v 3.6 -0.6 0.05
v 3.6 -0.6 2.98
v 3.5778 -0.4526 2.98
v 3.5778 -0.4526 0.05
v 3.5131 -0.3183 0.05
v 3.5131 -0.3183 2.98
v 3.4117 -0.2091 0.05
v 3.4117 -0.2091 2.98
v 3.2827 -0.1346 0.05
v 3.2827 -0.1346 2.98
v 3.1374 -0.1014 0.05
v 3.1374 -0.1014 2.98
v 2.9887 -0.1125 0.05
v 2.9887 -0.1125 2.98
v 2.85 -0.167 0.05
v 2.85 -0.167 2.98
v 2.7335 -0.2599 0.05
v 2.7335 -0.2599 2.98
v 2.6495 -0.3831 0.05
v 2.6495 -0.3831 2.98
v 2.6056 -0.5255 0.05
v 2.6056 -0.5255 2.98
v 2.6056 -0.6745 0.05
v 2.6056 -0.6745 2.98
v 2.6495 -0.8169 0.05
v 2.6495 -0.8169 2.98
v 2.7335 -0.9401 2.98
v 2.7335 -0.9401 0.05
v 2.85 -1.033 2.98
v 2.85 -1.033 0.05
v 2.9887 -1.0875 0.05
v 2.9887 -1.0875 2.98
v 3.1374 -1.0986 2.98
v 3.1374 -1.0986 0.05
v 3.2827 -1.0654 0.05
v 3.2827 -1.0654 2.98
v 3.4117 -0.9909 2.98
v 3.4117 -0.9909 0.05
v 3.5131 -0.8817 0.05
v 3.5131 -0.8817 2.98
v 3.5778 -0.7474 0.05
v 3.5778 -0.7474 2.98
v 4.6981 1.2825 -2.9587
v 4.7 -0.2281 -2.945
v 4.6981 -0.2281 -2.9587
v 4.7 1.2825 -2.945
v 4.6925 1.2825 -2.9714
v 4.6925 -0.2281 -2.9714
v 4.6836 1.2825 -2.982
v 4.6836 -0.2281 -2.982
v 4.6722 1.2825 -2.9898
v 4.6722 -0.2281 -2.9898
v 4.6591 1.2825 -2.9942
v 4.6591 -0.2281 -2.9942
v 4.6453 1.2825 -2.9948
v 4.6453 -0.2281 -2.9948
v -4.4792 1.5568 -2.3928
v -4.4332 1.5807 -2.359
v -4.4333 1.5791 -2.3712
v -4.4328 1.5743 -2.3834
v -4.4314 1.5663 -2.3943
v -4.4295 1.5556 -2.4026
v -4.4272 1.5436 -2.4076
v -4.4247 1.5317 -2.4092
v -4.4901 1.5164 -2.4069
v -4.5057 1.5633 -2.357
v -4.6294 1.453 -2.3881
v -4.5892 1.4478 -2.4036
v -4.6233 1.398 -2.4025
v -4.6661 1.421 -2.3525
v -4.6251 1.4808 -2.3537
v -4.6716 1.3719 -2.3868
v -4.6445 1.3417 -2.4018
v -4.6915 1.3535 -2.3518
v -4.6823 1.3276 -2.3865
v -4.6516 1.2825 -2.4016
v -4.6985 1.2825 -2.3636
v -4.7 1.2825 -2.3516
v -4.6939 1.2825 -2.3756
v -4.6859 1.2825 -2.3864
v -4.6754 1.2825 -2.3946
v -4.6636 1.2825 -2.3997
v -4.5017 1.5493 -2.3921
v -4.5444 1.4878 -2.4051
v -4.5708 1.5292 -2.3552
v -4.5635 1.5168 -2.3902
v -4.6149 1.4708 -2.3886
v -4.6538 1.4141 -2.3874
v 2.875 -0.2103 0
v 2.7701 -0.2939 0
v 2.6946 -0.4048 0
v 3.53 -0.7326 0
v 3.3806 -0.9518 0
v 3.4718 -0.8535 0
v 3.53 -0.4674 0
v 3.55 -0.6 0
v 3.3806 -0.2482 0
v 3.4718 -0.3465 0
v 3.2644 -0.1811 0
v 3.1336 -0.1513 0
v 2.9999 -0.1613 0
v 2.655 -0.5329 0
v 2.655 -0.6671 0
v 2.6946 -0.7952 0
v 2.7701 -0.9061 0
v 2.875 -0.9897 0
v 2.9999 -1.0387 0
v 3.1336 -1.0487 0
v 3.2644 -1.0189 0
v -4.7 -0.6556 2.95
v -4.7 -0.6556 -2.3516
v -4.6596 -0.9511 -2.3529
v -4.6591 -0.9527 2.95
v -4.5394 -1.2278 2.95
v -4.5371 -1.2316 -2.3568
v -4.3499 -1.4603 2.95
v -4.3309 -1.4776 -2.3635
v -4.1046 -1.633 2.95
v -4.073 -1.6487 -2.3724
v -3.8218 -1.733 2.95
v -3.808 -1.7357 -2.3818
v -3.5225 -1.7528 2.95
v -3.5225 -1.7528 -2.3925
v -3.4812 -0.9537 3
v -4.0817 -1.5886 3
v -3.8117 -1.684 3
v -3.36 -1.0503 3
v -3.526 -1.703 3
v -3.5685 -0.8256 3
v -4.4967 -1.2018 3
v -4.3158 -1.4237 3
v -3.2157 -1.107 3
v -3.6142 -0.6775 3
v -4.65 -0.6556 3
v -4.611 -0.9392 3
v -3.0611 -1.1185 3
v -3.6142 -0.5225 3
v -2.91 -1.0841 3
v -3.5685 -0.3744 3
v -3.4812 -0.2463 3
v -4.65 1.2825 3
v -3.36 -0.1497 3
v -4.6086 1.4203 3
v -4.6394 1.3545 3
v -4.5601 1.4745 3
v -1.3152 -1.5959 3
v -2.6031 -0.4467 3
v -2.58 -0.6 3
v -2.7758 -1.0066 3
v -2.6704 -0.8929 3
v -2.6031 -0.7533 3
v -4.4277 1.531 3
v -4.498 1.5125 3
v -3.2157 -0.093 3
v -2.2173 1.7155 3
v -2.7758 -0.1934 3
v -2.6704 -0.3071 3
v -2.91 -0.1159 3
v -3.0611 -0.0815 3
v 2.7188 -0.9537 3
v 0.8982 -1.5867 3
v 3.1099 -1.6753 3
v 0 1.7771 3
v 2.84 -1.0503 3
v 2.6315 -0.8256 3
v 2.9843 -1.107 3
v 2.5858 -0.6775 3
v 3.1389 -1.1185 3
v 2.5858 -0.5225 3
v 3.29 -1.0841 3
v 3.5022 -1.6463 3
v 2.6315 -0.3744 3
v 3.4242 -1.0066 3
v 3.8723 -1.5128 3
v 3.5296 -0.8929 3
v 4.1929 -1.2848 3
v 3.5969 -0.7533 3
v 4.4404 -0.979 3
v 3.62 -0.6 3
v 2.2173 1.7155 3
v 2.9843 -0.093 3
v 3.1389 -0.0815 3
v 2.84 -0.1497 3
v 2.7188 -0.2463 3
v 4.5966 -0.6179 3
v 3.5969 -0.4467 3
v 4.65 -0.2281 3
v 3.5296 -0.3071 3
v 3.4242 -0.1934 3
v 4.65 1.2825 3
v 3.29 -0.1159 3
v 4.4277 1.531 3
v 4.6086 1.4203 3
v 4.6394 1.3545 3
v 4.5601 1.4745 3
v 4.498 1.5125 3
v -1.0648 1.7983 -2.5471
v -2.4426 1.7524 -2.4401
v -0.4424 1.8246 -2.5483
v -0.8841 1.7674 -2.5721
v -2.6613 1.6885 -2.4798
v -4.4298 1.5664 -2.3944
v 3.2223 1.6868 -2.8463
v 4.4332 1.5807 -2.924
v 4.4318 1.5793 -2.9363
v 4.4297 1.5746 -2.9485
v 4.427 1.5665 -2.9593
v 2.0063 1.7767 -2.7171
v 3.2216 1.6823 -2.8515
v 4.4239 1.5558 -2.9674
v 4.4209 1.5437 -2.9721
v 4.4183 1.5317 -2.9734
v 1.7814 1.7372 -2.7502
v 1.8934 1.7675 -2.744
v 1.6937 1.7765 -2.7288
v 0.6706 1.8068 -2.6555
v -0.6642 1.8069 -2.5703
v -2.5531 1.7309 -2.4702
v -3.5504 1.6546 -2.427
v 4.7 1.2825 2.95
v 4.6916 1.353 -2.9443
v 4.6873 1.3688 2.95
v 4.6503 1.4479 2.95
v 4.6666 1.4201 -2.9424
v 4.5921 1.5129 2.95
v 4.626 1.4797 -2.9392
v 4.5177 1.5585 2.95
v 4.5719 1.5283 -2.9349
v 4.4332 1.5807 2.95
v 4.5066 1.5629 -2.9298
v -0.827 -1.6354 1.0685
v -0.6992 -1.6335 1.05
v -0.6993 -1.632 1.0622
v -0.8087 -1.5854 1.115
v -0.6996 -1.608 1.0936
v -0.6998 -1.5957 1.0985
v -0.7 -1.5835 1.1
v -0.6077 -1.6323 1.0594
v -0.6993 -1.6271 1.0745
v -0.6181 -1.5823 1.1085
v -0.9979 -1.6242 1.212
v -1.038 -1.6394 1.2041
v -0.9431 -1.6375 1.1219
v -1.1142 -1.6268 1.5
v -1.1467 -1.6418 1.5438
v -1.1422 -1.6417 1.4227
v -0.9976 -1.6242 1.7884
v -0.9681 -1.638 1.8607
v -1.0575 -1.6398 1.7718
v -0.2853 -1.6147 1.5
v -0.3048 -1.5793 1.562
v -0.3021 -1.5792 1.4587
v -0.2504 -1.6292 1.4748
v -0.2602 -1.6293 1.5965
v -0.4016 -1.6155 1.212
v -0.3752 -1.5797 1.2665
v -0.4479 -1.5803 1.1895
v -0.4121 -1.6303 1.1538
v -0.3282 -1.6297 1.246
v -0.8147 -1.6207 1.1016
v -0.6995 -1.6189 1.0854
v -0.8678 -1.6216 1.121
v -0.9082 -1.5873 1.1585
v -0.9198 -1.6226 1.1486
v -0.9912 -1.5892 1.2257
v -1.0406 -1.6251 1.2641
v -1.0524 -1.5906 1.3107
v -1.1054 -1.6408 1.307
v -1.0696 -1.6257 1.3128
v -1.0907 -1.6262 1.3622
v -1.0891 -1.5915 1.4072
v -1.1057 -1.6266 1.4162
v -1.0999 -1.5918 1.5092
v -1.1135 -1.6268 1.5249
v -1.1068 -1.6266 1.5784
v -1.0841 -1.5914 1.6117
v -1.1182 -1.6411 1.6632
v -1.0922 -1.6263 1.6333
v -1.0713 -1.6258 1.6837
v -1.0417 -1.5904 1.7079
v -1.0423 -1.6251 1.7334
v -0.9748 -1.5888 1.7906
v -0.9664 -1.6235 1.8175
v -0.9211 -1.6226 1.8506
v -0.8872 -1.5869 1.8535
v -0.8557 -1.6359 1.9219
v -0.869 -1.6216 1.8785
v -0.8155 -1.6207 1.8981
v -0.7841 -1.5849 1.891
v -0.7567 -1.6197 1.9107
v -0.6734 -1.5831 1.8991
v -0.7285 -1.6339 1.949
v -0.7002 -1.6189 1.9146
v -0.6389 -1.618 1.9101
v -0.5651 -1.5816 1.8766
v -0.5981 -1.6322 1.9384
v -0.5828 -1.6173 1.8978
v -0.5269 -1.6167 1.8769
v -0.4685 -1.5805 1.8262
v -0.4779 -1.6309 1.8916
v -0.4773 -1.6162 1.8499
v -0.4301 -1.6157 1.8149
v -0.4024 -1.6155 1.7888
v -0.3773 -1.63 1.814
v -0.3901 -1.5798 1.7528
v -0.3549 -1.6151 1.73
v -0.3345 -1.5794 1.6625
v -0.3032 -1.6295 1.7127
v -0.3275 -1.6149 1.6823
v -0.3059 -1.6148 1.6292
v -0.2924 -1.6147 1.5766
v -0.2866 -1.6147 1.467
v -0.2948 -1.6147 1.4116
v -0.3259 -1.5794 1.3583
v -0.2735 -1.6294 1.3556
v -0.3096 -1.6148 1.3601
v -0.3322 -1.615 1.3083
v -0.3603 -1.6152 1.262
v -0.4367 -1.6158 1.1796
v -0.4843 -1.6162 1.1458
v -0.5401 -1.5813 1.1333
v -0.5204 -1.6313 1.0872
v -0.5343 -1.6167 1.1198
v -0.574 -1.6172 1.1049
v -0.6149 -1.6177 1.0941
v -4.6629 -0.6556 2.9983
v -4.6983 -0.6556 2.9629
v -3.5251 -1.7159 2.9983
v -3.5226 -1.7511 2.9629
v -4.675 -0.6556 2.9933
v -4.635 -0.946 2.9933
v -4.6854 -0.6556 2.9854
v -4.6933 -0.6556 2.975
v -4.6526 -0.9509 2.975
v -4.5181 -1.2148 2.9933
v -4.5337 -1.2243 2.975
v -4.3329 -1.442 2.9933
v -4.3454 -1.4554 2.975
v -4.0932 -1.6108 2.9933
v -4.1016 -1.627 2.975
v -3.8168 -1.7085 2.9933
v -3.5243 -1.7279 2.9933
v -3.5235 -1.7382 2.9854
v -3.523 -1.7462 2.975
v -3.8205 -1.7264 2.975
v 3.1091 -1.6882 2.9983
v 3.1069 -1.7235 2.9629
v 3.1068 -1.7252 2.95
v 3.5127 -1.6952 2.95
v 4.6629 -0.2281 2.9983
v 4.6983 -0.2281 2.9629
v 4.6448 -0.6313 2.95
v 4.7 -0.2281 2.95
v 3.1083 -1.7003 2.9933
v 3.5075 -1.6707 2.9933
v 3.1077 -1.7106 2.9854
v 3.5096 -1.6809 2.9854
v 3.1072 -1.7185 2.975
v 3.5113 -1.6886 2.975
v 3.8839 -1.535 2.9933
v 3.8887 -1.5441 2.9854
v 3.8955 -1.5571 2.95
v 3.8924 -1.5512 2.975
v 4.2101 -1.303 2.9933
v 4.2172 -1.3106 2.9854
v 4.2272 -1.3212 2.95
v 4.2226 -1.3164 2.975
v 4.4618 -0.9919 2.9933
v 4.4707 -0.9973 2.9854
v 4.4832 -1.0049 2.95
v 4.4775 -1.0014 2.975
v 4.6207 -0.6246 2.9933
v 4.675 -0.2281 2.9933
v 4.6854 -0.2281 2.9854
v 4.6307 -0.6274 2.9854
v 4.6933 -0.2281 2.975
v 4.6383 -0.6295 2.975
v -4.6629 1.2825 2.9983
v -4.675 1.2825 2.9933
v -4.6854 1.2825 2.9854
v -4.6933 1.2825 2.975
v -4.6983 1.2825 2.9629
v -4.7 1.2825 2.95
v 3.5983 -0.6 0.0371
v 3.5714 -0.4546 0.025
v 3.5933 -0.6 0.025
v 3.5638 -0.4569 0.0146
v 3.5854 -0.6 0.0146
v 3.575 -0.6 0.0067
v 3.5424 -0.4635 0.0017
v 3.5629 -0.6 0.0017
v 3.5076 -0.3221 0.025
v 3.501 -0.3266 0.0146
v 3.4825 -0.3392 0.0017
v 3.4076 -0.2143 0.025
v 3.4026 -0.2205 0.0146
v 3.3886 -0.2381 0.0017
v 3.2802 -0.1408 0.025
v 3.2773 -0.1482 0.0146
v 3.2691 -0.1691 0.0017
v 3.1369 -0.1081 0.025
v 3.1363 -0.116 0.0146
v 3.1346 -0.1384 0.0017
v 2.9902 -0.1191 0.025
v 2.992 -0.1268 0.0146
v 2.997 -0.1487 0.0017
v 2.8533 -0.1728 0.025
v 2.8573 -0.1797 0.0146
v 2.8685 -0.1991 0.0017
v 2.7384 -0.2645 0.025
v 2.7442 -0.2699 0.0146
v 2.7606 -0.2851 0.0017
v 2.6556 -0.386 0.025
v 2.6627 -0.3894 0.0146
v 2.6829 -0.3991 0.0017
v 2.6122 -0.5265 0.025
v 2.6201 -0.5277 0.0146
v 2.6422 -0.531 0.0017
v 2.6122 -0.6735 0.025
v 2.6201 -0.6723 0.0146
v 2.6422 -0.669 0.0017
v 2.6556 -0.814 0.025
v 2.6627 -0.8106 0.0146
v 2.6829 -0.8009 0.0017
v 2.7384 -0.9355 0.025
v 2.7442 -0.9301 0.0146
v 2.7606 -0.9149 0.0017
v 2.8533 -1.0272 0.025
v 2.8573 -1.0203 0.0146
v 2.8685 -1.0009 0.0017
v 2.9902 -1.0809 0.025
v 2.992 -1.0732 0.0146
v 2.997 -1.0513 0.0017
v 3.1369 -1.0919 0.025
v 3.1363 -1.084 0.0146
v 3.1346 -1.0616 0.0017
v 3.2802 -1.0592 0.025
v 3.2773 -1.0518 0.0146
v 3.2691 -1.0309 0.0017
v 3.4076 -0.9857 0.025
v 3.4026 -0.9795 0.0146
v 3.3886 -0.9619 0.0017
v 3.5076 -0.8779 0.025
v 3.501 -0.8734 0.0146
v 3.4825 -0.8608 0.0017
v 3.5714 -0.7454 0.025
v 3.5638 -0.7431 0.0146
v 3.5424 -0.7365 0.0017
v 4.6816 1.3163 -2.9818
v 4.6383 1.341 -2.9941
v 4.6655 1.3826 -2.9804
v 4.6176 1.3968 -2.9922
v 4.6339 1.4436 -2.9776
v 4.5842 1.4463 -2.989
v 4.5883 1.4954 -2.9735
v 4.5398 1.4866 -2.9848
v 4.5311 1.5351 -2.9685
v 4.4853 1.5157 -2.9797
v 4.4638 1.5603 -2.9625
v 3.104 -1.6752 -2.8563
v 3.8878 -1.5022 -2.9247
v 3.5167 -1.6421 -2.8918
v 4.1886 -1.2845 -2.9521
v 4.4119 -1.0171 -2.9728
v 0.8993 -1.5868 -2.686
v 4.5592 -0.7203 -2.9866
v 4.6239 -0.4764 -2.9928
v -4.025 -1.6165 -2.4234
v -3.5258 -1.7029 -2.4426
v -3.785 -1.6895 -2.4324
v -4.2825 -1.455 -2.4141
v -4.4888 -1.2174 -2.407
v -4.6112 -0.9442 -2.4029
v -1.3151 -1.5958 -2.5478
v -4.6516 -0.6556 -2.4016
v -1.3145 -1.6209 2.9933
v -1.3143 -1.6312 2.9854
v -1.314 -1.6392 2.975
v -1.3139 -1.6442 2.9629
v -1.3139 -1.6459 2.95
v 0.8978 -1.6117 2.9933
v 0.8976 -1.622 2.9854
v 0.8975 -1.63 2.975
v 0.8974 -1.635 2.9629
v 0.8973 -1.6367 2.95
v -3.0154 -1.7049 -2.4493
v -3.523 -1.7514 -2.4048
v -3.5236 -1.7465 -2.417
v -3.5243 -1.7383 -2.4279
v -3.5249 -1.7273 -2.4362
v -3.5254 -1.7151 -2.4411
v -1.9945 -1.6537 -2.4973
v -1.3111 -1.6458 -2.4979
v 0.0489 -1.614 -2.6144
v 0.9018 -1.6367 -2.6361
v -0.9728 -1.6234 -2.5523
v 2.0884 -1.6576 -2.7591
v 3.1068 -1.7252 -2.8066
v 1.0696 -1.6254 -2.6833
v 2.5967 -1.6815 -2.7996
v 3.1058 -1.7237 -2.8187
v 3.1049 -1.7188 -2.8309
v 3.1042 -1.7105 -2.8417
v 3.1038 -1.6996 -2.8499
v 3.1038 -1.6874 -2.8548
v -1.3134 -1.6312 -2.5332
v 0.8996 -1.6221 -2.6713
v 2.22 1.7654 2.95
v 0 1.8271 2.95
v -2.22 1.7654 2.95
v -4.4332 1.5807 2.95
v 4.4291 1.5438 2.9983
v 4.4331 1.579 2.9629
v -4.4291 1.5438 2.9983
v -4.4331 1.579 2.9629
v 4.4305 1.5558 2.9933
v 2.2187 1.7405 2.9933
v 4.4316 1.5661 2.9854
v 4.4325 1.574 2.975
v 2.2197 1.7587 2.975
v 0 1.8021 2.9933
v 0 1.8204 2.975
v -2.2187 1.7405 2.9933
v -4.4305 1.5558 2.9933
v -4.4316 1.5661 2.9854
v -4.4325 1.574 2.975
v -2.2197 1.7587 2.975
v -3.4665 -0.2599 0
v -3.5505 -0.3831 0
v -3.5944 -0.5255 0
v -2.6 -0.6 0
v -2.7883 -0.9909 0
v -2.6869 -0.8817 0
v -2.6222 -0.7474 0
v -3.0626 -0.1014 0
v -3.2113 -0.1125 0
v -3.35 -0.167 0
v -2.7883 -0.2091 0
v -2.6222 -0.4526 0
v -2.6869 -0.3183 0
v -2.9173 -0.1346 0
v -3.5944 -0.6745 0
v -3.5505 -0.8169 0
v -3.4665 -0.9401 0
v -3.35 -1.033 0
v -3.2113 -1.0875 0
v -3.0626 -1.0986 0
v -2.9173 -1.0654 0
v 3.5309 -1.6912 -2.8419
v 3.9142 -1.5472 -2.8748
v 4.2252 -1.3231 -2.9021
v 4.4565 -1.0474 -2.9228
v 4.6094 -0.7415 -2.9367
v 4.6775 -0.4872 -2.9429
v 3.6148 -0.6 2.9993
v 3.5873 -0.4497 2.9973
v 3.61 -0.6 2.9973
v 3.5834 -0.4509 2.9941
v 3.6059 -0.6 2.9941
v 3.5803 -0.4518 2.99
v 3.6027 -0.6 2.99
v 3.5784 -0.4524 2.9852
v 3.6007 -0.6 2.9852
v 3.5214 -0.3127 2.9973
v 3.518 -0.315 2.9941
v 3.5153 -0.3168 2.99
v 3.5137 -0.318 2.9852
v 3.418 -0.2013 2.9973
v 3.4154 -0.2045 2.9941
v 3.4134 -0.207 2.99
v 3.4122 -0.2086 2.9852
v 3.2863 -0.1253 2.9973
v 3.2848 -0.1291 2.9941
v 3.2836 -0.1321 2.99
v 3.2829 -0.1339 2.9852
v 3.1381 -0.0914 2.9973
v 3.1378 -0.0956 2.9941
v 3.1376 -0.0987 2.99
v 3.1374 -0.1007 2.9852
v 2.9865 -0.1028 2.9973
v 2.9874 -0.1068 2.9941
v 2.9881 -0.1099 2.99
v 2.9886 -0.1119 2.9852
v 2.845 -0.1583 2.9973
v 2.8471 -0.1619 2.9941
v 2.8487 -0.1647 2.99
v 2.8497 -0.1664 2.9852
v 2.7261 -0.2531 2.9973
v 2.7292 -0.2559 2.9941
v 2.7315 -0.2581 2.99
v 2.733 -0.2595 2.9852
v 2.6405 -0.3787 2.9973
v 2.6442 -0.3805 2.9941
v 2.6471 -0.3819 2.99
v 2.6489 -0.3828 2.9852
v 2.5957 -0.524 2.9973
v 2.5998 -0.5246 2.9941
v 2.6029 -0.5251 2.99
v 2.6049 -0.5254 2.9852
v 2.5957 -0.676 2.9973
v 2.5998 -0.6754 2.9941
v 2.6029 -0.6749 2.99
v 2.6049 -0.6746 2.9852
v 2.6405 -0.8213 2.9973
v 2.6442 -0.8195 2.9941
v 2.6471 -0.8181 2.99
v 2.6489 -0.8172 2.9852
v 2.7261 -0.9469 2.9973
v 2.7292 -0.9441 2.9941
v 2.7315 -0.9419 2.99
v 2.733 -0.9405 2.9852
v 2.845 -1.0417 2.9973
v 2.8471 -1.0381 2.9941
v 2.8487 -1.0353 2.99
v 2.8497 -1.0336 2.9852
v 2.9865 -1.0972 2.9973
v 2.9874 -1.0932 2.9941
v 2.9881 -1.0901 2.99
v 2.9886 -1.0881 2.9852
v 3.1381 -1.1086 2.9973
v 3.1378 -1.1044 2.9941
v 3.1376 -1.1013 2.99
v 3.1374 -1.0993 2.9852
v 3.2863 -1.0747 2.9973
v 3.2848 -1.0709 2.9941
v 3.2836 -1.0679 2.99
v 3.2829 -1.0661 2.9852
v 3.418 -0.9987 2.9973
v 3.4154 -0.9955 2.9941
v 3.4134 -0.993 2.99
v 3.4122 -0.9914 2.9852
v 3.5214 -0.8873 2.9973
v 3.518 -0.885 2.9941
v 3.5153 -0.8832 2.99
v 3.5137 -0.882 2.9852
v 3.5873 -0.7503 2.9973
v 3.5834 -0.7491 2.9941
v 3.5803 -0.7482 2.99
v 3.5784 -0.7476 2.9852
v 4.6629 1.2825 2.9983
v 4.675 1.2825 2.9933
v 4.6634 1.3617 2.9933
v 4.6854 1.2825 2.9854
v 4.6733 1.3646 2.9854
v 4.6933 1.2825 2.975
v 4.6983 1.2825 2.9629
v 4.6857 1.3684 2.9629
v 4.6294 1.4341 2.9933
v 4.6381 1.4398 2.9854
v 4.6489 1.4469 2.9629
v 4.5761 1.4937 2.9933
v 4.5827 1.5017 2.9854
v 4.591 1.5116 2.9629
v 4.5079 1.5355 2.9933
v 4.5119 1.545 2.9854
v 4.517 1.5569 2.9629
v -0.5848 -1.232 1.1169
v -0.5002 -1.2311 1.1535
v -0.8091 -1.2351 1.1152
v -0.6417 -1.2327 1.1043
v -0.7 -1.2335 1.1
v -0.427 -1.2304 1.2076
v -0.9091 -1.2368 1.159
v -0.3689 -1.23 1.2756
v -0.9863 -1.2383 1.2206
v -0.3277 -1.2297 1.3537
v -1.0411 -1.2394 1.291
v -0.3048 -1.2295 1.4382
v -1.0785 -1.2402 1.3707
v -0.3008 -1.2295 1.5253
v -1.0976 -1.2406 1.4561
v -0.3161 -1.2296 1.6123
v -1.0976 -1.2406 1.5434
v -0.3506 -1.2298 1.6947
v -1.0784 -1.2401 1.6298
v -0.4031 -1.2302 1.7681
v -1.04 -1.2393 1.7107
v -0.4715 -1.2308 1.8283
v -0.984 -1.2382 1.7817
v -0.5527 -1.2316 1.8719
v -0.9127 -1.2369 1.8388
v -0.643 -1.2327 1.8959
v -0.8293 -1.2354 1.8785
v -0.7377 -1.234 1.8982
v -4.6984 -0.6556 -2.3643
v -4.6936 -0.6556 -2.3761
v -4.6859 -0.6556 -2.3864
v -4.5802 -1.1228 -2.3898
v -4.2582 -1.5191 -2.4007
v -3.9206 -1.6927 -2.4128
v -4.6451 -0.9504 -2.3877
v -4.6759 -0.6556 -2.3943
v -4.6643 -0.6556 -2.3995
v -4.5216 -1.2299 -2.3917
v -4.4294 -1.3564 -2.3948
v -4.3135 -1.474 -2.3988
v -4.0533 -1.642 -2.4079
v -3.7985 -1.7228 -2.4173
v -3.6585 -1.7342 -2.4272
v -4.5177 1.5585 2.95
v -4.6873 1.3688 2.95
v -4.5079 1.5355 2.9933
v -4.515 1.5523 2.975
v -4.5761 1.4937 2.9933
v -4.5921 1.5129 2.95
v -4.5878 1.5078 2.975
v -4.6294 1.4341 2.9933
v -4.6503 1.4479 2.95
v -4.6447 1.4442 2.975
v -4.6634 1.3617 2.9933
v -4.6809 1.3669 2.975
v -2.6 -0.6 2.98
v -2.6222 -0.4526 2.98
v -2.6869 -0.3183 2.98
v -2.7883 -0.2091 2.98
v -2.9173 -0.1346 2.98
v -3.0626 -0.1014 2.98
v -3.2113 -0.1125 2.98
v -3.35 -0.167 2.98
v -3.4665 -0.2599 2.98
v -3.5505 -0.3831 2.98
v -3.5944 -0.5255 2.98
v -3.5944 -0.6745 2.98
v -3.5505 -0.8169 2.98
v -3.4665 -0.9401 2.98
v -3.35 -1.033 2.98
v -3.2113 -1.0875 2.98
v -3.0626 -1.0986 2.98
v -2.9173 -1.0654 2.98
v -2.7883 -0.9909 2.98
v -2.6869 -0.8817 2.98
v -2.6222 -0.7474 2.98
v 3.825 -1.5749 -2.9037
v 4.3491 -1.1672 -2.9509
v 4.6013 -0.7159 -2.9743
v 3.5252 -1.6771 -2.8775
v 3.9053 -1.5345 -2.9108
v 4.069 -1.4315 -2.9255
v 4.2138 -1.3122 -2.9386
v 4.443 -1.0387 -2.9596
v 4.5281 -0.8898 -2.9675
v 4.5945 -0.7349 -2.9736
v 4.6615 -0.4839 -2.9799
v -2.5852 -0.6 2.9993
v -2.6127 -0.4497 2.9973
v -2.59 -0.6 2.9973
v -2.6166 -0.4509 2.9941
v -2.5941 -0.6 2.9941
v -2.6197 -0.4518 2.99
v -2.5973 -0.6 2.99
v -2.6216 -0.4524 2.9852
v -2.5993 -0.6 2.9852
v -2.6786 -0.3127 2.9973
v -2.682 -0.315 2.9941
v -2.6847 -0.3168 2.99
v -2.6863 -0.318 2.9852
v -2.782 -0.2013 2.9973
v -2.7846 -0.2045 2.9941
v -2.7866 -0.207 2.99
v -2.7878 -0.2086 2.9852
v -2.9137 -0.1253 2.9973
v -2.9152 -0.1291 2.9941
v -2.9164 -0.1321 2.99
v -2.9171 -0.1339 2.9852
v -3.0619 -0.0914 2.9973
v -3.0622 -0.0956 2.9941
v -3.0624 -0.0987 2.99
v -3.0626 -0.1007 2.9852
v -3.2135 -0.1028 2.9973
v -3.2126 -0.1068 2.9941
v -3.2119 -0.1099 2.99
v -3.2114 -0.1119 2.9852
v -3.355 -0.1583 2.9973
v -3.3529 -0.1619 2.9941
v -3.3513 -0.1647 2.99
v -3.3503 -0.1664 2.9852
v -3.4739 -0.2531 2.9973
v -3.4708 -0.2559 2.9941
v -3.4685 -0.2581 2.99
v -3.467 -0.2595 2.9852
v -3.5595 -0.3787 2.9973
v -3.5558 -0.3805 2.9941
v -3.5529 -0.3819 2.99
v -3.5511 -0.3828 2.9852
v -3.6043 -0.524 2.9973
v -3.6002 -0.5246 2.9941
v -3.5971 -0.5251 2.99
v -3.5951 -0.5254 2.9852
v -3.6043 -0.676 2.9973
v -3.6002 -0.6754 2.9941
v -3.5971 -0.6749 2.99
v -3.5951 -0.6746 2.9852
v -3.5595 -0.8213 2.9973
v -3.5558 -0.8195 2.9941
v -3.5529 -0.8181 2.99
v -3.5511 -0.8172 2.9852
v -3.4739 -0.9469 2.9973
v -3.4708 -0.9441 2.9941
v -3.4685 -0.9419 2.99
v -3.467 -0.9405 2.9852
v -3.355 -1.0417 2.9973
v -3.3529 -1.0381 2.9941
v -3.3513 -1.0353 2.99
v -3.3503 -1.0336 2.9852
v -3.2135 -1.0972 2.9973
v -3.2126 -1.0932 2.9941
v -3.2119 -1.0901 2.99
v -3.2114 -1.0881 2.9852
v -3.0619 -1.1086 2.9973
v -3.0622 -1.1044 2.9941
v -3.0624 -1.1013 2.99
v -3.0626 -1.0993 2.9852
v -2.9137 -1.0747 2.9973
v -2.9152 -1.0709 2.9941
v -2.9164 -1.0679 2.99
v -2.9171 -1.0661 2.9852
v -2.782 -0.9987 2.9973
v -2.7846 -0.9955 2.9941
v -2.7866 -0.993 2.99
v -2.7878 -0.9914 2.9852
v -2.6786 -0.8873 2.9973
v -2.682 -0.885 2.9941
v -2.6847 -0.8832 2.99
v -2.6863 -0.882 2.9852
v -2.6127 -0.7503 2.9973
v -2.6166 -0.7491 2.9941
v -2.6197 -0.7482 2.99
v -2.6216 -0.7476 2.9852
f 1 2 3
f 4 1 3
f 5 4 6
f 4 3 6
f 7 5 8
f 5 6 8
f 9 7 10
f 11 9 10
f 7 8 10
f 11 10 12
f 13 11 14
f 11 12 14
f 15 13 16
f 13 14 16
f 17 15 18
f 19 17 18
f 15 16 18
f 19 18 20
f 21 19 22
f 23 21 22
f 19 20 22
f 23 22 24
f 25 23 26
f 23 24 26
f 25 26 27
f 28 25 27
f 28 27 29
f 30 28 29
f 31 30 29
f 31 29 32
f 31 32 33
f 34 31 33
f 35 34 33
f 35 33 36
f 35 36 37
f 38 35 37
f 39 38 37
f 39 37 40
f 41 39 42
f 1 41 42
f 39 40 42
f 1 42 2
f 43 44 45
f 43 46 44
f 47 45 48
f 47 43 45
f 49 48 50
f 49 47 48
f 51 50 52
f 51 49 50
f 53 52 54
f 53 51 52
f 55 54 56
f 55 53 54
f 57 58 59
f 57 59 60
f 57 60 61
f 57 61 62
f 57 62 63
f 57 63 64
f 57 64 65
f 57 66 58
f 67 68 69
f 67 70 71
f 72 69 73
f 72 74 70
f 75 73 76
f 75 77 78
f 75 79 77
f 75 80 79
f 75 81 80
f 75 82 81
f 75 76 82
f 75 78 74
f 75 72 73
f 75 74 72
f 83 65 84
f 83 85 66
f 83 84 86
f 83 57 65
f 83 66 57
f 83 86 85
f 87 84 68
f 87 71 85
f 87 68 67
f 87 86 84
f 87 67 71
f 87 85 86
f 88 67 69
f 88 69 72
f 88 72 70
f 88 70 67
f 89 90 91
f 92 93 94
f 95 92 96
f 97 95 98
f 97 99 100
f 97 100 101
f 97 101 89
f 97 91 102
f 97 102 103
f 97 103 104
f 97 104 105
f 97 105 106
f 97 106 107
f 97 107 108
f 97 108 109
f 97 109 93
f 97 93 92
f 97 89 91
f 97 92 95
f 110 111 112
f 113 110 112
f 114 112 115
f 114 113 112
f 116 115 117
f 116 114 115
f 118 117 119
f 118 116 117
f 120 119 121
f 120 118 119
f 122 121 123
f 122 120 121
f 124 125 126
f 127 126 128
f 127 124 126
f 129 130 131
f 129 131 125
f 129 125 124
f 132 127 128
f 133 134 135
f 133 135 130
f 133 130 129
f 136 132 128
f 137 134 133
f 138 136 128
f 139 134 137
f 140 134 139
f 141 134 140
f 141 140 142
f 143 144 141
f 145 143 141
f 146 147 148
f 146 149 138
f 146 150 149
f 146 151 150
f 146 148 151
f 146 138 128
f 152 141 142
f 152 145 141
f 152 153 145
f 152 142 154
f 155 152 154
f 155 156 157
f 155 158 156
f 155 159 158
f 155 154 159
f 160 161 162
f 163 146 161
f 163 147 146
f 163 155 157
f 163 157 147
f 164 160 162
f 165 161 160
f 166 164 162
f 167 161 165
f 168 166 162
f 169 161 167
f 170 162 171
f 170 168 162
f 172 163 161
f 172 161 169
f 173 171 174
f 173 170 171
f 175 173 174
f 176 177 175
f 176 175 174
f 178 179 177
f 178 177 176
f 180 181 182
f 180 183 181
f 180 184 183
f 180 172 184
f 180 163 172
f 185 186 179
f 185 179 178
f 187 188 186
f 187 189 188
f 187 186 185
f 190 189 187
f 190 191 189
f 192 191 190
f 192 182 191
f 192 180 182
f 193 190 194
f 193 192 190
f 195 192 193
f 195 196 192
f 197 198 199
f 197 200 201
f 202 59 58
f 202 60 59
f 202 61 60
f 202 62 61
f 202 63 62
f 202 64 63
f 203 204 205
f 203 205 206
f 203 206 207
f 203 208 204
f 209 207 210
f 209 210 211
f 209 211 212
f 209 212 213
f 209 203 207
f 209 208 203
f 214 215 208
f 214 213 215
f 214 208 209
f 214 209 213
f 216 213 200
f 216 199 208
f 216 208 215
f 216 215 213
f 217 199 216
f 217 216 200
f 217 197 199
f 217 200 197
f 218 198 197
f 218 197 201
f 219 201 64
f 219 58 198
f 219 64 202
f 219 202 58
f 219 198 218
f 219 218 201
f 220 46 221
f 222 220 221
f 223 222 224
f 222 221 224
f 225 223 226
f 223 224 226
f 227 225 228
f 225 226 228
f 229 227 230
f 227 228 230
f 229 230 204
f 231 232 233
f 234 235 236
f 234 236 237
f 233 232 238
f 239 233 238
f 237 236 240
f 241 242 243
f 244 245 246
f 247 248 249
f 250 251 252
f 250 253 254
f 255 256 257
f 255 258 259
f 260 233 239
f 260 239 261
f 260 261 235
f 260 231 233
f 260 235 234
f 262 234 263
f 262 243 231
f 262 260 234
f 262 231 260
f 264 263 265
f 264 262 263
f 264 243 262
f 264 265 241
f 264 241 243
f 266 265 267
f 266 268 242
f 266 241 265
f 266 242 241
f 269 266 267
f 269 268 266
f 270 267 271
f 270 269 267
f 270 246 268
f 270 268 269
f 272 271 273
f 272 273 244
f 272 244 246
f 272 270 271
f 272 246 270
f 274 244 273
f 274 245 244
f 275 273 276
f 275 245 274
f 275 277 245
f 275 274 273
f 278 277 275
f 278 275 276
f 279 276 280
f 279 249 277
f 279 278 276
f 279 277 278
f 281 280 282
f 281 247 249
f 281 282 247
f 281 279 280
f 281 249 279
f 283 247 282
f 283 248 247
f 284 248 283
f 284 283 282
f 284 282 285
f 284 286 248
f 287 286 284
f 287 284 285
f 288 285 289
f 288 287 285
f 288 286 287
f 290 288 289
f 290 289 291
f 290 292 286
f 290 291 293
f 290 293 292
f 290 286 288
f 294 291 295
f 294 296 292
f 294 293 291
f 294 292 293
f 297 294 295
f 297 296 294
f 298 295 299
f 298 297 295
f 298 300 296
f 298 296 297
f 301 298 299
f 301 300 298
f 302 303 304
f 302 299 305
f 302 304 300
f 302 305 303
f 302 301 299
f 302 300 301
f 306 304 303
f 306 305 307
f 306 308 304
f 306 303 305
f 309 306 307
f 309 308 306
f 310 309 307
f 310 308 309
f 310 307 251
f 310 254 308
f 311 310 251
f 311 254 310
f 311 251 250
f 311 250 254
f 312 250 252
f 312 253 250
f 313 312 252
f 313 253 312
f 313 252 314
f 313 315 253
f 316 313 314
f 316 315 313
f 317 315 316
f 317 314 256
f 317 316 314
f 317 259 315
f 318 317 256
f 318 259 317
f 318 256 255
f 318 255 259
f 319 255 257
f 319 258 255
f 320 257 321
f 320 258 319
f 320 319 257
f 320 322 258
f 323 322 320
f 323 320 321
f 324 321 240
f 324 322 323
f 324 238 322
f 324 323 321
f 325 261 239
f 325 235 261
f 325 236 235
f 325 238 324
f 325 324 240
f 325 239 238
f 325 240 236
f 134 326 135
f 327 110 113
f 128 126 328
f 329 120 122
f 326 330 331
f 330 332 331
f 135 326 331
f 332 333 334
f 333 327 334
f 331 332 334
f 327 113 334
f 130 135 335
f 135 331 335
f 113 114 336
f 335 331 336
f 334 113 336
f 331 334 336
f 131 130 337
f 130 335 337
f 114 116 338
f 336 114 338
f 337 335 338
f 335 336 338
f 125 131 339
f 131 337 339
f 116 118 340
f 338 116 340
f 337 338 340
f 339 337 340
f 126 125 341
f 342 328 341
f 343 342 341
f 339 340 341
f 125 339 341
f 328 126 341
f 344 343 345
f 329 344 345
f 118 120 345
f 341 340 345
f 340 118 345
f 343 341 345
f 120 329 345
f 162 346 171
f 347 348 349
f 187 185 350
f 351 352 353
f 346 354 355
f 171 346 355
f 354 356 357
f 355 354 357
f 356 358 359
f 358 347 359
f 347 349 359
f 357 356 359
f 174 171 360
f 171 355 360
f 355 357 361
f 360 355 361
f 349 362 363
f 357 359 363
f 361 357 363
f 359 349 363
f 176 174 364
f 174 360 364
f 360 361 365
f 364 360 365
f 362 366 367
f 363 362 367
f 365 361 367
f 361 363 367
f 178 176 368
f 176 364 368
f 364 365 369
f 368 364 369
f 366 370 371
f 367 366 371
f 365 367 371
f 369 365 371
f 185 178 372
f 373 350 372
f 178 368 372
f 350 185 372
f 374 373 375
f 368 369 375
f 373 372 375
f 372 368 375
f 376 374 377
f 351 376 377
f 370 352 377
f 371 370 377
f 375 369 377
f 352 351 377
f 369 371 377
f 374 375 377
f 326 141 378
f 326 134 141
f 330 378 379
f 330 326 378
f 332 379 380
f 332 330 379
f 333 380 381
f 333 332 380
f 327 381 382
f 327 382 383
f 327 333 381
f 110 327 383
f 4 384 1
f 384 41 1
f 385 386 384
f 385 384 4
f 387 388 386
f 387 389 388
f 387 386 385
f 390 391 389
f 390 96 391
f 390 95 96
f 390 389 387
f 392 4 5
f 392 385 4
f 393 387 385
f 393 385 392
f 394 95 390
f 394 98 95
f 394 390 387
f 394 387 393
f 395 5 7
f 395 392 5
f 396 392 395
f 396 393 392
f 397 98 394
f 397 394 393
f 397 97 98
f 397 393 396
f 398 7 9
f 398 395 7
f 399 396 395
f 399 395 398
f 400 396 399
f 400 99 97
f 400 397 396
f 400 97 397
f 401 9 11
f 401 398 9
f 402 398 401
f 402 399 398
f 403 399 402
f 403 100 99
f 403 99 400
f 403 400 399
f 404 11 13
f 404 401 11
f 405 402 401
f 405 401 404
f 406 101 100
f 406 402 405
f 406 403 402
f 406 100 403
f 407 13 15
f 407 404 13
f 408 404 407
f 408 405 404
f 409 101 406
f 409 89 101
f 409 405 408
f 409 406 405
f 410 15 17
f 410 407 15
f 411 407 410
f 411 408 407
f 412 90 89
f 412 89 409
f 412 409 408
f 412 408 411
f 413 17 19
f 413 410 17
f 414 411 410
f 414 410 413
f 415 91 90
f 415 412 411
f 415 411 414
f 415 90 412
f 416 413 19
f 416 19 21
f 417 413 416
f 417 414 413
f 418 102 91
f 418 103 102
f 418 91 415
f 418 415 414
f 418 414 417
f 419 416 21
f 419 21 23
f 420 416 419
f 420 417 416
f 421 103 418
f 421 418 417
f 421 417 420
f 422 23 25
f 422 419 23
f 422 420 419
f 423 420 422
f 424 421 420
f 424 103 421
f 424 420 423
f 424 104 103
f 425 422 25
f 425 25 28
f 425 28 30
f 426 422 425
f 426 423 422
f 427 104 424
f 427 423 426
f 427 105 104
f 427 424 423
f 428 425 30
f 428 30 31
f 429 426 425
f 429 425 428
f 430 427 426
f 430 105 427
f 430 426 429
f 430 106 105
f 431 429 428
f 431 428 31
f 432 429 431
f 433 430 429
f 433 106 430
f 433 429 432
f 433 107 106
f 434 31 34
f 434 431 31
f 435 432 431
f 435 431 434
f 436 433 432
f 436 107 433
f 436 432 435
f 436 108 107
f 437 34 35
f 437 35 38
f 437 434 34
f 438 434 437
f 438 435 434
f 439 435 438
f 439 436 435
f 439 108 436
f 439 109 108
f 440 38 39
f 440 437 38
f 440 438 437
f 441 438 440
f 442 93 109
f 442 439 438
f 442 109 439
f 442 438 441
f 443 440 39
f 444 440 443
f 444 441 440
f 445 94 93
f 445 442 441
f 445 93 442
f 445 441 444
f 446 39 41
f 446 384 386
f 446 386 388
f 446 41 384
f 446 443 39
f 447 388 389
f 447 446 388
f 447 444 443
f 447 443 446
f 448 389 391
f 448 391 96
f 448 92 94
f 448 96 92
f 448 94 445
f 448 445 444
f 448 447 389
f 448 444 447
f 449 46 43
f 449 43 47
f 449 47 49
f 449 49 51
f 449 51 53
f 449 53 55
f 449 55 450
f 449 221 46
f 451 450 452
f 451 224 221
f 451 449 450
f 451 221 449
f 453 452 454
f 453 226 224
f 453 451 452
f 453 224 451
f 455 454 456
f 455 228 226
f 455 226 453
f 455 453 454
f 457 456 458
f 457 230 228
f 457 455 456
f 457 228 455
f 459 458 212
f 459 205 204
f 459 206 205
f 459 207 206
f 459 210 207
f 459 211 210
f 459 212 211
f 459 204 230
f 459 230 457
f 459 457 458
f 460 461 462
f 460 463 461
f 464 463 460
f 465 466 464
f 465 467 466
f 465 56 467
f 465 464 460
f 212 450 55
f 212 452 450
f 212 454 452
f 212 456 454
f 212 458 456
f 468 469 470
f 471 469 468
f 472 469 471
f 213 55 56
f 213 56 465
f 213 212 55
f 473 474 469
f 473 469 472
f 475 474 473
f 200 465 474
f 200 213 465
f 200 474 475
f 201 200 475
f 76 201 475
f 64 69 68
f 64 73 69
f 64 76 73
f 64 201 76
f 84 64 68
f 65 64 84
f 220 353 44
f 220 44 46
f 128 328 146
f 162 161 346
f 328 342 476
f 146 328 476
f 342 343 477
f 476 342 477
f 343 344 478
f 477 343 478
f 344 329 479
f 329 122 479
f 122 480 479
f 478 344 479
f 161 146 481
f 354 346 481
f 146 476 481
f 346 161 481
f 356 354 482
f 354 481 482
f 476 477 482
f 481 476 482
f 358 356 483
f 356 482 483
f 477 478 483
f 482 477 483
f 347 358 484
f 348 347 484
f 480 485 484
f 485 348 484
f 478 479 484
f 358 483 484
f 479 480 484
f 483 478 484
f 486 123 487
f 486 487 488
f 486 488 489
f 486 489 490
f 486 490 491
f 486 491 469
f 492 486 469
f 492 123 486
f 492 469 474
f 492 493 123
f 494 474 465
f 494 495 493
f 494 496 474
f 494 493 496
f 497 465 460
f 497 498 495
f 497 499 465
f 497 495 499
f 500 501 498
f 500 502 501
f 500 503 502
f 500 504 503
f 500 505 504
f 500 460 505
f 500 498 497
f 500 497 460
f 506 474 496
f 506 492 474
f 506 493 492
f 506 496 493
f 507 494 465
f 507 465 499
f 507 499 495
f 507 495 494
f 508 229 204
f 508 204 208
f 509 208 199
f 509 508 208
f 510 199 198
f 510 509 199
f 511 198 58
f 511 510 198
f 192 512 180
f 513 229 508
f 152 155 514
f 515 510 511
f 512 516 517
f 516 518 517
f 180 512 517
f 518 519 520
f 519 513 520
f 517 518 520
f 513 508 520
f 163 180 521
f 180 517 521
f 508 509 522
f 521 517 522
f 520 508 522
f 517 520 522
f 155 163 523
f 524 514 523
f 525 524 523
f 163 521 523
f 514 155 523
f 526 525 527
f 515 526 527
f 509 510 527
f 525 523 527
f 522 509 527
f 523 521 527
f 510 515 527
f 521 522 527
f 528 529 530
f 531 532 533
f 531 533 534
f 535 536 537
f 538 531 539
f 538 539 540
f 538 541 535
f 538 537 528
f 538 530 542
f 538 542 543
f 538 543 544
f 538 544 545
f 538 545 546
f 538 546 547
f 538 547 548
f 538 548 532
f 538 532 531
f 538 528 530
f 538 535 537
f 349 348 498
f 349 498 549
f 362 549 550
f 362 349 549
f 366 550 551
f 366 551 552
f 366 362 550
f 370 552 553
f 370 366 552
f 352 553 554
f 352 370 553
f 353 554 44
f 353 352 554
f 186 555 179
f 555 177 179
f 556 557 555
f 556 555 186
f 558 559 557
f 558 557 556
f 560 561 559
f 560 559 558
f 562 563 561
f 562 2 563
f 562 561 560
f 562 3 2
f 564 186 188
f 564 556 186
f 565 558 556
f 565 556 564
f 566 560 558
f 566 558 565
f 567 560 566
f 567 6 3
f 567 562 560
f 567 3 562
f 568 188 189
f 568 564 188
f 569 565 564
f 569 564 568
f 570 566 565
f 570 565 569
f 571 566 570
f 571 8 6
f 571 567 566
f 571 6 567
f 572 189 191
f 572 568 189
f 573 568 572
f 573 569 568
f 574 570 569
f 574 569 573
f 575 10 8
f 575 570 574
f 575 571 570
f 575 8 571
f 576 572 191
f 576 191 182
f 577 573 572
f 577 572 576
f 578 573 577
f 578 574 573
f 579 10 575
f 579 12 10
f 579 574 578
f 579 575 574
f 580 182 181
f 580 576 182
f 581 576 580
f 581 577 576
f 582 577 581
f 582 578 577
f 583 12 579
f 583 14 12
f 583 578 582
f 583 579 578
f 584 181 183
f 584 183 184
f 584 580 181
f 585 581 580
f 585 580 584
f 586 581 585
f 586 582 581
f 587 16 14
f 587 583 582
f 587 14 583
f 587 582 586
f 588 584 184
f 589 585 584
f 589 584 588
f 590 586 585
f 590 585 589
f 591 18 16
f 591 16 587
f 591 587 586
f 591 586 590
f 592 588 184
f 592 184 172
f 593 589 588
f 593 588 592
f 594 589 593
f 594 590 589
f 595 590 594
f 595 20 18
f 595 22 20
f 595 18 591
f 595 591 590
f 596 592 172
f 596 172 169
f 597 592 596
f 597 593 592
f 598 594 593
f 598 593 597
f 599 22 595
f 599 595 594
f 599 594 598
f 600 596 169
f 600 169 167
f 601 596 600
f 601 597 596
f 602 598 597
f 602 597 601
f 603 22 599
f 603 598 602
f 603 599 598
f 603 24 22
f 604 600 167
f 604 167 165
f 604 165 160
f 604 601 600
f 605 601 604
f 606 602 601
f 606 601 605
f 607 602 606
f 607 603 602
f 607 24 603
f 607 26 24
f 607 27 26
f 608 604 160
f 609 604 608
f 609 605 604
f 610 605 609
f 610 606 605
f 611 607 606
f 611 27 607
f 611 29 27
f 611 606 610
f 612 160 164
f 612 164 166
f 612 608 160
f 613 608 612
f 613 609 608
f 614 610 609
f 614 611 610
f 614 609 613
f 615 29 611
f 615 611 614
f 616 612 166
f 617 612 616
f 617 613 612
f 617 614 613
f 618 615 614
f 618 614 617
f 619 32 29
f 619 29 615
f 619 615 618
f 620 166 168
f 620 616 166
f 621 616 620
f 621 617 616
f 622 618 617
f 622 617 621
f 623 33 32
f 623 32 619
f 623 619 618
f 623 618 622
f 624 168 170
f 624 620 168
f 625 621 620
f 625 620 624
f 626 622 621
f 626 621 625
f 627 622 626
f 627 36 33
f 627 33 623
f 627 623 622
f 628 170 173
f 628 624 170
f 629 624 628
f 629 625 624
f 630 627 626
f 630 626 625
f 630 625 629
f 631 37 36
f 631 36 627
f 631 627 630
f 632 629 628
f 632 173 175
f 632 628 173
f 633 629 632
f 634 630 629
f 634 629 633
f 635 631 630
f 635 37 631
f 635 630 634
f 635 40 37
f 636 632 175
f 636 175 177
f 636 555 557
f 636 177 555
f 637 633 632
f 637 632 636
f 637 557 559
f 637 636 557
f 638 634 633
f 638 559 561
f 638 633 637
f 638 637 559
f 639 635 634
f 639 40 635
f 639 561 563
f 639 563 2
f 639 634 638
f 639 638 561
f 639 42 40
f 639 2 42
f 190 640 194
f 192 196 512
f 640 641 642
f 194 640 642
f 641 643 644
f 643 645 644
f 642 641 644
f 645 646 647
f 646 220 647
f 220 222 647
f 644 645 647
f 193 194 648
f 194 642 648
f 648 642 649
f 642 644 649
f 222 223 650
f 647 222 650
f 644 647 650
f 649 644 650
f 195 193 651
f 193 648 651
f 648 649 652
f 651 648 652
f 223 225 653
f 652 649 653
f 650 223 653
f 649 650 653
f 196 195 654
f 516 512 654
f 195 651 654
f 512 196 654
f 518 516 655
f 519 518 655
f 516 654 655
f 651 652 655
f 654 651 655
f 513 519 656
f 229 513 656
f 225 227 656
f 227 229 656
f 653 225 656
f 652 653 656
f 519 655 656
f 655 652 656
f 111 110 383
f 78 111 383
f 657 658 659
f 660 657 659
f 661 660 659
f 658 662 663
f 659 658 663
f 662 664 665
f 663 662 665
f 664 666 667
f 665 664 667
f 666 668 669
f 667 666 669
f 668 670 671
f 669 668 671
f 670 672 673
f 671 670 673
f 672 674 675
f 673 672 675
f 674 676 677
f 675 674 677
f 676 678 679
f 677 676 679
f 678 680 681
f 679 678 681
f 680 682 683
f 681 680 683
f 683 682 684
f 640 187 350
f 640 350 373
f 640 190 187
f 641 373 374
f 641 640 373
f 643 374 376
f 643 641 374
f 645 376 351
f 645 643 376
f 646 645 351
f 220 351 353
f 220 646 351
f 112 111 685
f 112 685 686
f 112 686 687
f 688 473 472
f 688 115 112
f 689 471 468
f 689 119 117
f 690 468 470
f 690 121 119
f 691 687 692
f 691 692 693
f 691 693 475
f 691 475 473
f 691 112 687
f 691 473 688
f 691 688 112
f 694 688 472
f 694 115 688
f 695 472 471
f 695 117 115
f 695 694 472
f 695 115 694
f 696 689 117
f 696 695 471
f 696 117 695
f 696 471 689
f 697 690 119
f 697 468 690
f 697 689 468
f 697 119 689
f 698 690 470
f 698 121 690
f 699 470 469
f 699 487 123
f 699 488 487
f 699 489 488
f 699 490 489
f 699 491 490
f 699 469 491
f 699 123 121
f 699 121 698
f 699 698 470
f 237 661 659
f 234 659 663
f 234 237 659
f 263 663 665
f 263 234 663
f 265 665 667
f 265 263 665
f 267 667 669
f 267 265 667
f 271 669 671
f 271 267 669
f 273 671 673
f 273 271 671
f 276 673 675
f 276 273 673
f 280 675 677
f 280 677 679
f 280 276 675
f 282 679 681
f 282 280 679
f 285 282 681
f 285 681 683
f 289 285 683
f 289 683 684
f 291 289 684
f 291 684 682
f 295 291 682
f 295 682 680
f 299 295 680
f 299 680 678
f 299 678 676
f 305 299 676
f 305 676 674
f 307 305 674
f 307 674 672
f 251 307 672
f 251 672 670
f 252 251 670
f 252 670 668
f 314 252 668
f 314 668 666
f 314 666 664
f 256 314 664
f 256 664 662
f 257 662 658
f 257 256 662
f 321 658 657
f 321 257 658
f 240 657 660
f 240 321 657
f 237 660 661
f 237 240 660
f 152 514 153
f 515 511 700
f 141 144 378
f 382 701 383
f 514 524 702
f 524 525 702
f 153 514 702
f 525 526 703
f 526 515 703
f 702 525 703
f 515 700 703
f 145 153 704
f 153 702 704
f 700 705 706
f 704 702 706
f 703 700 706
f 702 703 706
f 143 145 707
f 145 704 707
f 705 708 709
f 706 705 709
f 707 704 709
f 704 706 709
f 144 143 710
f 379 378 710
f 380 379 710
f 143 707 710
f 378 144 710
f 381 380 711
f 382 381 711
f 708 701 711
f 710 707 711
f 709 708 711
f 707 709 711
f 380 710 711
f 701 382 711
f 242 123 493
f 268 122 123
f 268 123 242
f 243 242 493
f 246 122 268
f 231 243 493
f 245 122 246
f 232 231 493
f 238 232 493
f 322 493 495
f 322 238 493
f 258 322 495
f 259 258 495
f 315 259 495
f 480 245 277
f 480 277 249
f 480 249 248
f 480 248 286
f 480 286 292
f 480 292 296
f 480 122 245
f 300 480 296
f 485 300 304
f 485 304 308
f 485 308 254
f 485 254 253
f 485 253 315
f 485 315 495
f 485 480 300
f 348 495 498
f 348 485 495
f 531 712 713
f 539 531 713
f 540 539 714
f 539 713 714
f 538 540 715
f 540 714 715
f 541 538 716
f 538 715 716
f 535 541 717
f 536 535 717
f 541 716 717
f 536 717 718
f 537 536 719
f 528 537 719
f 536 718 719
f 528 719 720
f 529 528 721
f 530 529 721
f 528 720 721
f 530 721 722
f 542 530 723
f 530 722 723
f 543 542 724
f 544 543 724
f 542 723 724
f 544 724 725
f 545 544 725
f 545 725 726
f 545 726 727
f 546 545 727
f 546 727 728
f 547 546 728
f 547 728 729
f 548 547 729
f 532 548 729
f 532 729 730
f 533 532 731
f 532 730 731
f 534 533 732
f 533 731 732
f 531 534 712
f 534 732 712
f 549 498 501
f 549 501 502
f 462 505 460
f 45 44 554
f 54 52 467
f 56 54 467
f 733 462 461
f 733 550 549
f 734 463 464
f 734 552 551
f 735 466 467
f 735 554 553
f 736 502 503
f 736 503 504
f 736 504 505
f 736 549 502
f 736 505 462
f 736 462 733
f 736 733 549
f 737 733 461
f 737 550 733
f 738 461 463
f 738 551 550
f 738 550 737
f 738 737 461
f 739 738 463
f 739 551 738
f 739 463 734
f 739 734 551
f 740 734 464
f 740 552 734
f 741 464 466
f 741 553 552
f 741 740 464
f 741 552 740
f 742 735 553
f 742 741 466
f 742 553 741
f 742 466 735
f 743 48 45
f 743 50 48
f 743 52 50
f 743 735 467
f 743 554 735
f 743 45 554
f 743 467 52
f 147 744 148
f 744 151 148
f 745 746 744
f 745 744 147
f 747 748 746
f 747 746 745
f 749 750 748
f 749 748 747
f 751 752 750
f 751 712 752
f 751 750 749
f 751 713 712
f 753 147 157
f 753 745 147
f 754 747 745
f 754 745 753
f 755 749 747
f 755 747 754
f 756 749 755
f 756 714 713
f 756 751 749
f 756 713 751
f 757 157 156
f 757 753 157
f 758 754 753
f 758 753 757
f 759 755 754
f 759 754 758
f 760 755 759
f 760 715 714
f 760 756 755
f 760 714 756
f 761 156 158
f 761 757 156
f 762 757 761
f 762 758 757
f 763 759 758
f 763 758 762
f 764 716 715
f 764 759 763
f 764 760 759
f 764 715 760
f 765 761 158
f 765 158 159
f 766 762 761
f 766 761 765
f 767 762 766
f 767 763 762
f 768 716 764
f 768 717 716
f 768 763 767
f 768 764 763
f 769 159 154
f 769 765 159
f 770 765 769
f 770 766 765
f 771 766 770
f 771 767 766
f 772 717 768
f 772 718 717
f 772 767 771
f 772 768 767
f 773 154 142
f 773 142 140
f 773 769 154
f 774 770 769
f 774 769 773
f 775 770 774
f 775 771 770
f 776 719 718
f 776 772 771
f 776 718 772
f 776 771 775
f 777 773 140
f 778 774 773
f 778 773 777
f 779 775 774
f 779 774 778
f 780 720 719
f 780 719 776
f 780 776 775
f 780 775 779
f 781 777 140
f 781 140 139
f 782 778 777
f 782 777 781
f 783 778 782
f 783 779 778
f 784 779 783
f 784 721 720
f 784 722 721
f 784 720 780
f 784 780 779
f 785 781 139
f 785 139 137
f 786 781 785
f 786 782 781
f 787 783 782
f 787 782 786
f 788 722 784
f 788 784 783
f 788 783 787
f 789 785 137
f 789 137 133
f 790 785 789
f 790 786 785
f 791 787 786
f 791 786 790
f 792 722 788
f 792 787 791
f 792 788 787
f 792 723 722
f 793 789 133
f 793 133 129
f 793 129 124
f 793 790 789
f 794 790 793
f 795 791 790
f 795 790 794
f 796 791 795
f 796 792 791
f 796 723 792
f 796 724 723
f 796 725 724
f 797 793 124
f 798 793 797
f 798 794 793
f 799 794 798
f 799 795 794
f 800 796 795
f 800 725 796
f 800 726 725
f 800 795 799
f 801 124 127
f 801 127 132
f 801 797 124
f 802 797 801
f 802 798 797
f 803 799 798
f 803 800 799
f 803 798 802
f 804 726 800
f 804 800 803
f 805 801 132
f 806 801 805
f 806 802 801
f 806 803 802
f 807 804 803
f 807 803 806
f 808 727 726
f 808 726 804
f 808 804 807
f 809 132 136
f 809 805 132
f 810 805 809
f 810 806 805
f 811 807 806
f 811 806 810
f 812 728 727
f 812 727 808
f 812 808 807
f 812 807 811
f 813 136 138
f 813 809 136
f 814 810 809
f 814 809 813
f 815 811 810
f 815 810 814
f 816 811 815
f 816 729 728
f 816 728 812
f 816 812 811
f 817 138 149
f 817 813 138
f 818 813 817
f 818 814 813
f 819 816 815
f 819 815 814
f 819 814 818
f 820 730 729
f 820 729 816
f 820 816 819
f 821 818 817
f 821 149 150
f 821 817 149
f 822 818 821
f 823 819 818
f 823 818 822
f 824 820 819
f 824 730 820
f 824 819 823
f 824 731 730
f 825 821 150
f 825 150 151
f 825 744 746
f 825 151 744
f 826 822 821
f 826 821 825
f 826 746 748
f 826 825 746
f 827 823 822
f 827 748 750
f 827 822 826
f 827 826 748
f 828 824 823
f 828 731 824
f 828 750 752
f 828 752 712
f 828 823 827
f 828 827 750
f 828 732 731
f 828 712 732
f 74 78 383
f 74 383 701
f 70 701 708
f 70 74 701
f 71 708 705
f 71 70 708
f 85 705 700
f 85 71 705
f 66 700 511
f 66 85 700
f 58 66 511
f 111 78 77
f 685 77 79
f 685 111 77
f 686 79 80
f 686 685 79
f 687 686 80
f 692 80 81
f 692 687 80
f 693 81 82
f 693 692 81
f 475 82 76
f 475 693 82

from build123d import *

# Parameters (mm, degrees)
SKETCH1_W               = 9.4
SKETCH1_H               = 3.7
BOSS_EXTRUDE1_DEPTH     = 3
CUT_EXTRUDE1_DEPTH      = 15.6
FILLET1_R               = 1.1
FILLET6_R               = 1.5
FILLET2_R               = 0.3
SKETCH3_R               = 0.5
CUT_EXTRUDE2_DEPTH      = 3
CUT_EXTRUDE3_DEPTH      = 5
FILLET5_R               = 0.05
CUT_EXTRUDE5_REACH      = 17.868
CUT_EXTRUDE5_END_RADIUS = 50.4
CUT_EXTRUDE5_START      = -10
SKETCH5_R               = 0.4
FILLET7_R               = 0.05
FILLET8_R               = 0.02


with BuildPart() as part:
    # Sketch1 → Boss-Extrude1 (new, symmetric)
    with BuildSketch(Plane.XY):
        Rectangle(SKETCH1_W, SKETCH1_H)
    extrude(amount=BOSS_EXTRUDE1_DEPTH, both=True)

    # Sketch2 → Cut-Extrude1 (cut)
    with BuildSketch(Plane.XY.offset(3)):
        with BuildLine():
            Line((-4.7, 1.55), (-7.120690005, 4.011417256))
            Line((-7.120690005, 4.011417256), (5.535860742, 3.886722174))
            Line((5.535860742, 3.886722174), (4.7, 1.55))
            ThreePointArc((4.7, 1.55), (0, 1.827084699), (-4.7, 1.55))
        make_face()
        with BuildLine():
            Line((4.7, -1.85), (0.350623614, -3.782025322))
            Line((0.350623614, -3.782025322), (-4.7, -1.85))
            ThreePointArc((-4.7, -1.85), (0, -1.628609864), (4.7, -1.85))
        make_face()
    extrude(amount=-CUT_EXTRUDE1_DEPTH, mode=Mode.SUBTRACT)

    # Fillet1
    fillet1_edges = [part.edges().sort_by_distance(p)[0] for p in [
        (-4.7, -1.85, 0),
    ]]
    fillet(fillet1_edges, radius=FILLET1_R)

    # Fillet6
    fillet6_edges = [part.edges().sort_by_distance(p)[0] for p in [
        (4.7, -1.85, 0),
    ]]
    fillet(fillet6_edges, radius=FILLET6_R)

    # Fillet2
    fillet2_edges = [part.edges().sort_by_distance(p)[0] for p in [
        (4.7, 1.55, 0),
        (-4.7, 1.55, 0),
    ]]
    fillet(fillet2_edges, radius=FILLET2_R)

    # Sketch3 → Cut-Extrude2 (cut)
    with BuildSketch(Plane.XY.offset(3)):
        with Locations((3.1, -0.6)):
            Circle(SKETCH3_R)
        with Locations((-3.1, -0.6)):
            Circle(SKETCH3_R)
    extrude(amount=-CUT_EXTRUDE2_DEPTH, mode=Mode.SUBTRACT)

    # Sketch4 → Cut-Extrude3 (cut, symmetric)
    with BuildSketch(Plane(origin=(0, 0, 0), x_dir=(1, 0, 0), z_dir=(0, 1, 0))):
        with BuildLine():
            Line((-4.7, 2.4), (-6.612719149, 4.113907535))
            Line((-6.612719149, 4.113907535), (6.420677859, 4.974089961))
            Line((6.420677859, 4.974089961), (4.7, 3))
            ThreePointArc((4.7, 3), (0.004710726, 2.626198627), (-4.7, 2.4))
        make_face()
    extrude(amount=CUT_EXTRUDE3_DEPTH, both=True, mode=Mode.SUBTRACT)

    # Fillet5
    fillet5_edges = [part.edges().sort_by_distance(p)[0] for p in [
        (-4.349918456, -1.460327621, 3),
        (4.7, 0.527189546, -3),
        (4.7, 0.527189546, 3),
        (-0.208312642, -1.629043808, 3),
        (4.22717919, -1.321239633, 3),
        (0, 1.827084699, 3),
        (-4.7, 0.3134624, 3),
        (-4.623578634, 1.482534062, 3),
        (4.623578634, 1.482534062, 3),
        (2.6, -0.6, 0),
        (-4.623553452, 1.482562201, -2.402492735),
        (-4.349757648, -1.460477444, -2.41174073),
        (4.226094878, -1.322257528, -2.955532113),
        (4.623384052, 1.482751333, -2.992708088),
        (-0.206022635, -1.629034318, -2.612896489),
        (0.004177998, 1.827084481, -2.626164624),
        (-4.7, 0.3134624, -2.4),
    ]]
    fillet(fillet5_edges, radius=FILLET5_R)

    # Cut-Extrude5: up to this cylinder (the profile starts inside it)
    cut_extrude5_end = Plane(origin=(0, -51.628609864, 1.5), z_dir=(0, 0, 1)) * Cylinder(CUT_EXTRUDE5_END_RADIUS, 137.536, mode=Mode.PRIVATE)
    # Sketch5 → Cut-Extrude5 (cut, up to the surface)
    with BuildSketch(Plane(origin=(0, 0, 0), x_dir=(1, 0, 0), z_dir=(0, 1, 0)).offset(CUT_EXTRUDE5_START), mode=Mode.PRIVATE) as cut_extrude5_sk1:
        with Locations(Location((-0.7, -1.5, 0), (0, 0, 90))):
            Circle(SKETCH5_R)
    cut_extrude5_tool1 = extrude(cut_extrude5_sk1.sketch, amount=CUT_EXTRUDE5_REACH, mode=Mode.PRIVATE) & cut_extrude5_end
    add(cut_extrude5_tool1.solids().sort_by_distance((-0.7, -10, 1.5))[0], mode=Mode.SUBTRACT)

    # Fillet7
    fillet7_edges = [part.edges().sort_by_distance(p)[0] for p in [
        (-0.700029875, -1.633510522, 1.899999999),
    ]]
    fillet(fillet7_edges, radius=FILLET7_R)

    # Fillet8
    fillet8_edges = [part.edges().sort_by_distance(p)[0] for p in [
        (2.6, -0.6, 3),
        (-3.6, -0.6, 3),
    ]]
    fillet(fillet8_edges, radius=FILLET8_R)


solid = part.part
